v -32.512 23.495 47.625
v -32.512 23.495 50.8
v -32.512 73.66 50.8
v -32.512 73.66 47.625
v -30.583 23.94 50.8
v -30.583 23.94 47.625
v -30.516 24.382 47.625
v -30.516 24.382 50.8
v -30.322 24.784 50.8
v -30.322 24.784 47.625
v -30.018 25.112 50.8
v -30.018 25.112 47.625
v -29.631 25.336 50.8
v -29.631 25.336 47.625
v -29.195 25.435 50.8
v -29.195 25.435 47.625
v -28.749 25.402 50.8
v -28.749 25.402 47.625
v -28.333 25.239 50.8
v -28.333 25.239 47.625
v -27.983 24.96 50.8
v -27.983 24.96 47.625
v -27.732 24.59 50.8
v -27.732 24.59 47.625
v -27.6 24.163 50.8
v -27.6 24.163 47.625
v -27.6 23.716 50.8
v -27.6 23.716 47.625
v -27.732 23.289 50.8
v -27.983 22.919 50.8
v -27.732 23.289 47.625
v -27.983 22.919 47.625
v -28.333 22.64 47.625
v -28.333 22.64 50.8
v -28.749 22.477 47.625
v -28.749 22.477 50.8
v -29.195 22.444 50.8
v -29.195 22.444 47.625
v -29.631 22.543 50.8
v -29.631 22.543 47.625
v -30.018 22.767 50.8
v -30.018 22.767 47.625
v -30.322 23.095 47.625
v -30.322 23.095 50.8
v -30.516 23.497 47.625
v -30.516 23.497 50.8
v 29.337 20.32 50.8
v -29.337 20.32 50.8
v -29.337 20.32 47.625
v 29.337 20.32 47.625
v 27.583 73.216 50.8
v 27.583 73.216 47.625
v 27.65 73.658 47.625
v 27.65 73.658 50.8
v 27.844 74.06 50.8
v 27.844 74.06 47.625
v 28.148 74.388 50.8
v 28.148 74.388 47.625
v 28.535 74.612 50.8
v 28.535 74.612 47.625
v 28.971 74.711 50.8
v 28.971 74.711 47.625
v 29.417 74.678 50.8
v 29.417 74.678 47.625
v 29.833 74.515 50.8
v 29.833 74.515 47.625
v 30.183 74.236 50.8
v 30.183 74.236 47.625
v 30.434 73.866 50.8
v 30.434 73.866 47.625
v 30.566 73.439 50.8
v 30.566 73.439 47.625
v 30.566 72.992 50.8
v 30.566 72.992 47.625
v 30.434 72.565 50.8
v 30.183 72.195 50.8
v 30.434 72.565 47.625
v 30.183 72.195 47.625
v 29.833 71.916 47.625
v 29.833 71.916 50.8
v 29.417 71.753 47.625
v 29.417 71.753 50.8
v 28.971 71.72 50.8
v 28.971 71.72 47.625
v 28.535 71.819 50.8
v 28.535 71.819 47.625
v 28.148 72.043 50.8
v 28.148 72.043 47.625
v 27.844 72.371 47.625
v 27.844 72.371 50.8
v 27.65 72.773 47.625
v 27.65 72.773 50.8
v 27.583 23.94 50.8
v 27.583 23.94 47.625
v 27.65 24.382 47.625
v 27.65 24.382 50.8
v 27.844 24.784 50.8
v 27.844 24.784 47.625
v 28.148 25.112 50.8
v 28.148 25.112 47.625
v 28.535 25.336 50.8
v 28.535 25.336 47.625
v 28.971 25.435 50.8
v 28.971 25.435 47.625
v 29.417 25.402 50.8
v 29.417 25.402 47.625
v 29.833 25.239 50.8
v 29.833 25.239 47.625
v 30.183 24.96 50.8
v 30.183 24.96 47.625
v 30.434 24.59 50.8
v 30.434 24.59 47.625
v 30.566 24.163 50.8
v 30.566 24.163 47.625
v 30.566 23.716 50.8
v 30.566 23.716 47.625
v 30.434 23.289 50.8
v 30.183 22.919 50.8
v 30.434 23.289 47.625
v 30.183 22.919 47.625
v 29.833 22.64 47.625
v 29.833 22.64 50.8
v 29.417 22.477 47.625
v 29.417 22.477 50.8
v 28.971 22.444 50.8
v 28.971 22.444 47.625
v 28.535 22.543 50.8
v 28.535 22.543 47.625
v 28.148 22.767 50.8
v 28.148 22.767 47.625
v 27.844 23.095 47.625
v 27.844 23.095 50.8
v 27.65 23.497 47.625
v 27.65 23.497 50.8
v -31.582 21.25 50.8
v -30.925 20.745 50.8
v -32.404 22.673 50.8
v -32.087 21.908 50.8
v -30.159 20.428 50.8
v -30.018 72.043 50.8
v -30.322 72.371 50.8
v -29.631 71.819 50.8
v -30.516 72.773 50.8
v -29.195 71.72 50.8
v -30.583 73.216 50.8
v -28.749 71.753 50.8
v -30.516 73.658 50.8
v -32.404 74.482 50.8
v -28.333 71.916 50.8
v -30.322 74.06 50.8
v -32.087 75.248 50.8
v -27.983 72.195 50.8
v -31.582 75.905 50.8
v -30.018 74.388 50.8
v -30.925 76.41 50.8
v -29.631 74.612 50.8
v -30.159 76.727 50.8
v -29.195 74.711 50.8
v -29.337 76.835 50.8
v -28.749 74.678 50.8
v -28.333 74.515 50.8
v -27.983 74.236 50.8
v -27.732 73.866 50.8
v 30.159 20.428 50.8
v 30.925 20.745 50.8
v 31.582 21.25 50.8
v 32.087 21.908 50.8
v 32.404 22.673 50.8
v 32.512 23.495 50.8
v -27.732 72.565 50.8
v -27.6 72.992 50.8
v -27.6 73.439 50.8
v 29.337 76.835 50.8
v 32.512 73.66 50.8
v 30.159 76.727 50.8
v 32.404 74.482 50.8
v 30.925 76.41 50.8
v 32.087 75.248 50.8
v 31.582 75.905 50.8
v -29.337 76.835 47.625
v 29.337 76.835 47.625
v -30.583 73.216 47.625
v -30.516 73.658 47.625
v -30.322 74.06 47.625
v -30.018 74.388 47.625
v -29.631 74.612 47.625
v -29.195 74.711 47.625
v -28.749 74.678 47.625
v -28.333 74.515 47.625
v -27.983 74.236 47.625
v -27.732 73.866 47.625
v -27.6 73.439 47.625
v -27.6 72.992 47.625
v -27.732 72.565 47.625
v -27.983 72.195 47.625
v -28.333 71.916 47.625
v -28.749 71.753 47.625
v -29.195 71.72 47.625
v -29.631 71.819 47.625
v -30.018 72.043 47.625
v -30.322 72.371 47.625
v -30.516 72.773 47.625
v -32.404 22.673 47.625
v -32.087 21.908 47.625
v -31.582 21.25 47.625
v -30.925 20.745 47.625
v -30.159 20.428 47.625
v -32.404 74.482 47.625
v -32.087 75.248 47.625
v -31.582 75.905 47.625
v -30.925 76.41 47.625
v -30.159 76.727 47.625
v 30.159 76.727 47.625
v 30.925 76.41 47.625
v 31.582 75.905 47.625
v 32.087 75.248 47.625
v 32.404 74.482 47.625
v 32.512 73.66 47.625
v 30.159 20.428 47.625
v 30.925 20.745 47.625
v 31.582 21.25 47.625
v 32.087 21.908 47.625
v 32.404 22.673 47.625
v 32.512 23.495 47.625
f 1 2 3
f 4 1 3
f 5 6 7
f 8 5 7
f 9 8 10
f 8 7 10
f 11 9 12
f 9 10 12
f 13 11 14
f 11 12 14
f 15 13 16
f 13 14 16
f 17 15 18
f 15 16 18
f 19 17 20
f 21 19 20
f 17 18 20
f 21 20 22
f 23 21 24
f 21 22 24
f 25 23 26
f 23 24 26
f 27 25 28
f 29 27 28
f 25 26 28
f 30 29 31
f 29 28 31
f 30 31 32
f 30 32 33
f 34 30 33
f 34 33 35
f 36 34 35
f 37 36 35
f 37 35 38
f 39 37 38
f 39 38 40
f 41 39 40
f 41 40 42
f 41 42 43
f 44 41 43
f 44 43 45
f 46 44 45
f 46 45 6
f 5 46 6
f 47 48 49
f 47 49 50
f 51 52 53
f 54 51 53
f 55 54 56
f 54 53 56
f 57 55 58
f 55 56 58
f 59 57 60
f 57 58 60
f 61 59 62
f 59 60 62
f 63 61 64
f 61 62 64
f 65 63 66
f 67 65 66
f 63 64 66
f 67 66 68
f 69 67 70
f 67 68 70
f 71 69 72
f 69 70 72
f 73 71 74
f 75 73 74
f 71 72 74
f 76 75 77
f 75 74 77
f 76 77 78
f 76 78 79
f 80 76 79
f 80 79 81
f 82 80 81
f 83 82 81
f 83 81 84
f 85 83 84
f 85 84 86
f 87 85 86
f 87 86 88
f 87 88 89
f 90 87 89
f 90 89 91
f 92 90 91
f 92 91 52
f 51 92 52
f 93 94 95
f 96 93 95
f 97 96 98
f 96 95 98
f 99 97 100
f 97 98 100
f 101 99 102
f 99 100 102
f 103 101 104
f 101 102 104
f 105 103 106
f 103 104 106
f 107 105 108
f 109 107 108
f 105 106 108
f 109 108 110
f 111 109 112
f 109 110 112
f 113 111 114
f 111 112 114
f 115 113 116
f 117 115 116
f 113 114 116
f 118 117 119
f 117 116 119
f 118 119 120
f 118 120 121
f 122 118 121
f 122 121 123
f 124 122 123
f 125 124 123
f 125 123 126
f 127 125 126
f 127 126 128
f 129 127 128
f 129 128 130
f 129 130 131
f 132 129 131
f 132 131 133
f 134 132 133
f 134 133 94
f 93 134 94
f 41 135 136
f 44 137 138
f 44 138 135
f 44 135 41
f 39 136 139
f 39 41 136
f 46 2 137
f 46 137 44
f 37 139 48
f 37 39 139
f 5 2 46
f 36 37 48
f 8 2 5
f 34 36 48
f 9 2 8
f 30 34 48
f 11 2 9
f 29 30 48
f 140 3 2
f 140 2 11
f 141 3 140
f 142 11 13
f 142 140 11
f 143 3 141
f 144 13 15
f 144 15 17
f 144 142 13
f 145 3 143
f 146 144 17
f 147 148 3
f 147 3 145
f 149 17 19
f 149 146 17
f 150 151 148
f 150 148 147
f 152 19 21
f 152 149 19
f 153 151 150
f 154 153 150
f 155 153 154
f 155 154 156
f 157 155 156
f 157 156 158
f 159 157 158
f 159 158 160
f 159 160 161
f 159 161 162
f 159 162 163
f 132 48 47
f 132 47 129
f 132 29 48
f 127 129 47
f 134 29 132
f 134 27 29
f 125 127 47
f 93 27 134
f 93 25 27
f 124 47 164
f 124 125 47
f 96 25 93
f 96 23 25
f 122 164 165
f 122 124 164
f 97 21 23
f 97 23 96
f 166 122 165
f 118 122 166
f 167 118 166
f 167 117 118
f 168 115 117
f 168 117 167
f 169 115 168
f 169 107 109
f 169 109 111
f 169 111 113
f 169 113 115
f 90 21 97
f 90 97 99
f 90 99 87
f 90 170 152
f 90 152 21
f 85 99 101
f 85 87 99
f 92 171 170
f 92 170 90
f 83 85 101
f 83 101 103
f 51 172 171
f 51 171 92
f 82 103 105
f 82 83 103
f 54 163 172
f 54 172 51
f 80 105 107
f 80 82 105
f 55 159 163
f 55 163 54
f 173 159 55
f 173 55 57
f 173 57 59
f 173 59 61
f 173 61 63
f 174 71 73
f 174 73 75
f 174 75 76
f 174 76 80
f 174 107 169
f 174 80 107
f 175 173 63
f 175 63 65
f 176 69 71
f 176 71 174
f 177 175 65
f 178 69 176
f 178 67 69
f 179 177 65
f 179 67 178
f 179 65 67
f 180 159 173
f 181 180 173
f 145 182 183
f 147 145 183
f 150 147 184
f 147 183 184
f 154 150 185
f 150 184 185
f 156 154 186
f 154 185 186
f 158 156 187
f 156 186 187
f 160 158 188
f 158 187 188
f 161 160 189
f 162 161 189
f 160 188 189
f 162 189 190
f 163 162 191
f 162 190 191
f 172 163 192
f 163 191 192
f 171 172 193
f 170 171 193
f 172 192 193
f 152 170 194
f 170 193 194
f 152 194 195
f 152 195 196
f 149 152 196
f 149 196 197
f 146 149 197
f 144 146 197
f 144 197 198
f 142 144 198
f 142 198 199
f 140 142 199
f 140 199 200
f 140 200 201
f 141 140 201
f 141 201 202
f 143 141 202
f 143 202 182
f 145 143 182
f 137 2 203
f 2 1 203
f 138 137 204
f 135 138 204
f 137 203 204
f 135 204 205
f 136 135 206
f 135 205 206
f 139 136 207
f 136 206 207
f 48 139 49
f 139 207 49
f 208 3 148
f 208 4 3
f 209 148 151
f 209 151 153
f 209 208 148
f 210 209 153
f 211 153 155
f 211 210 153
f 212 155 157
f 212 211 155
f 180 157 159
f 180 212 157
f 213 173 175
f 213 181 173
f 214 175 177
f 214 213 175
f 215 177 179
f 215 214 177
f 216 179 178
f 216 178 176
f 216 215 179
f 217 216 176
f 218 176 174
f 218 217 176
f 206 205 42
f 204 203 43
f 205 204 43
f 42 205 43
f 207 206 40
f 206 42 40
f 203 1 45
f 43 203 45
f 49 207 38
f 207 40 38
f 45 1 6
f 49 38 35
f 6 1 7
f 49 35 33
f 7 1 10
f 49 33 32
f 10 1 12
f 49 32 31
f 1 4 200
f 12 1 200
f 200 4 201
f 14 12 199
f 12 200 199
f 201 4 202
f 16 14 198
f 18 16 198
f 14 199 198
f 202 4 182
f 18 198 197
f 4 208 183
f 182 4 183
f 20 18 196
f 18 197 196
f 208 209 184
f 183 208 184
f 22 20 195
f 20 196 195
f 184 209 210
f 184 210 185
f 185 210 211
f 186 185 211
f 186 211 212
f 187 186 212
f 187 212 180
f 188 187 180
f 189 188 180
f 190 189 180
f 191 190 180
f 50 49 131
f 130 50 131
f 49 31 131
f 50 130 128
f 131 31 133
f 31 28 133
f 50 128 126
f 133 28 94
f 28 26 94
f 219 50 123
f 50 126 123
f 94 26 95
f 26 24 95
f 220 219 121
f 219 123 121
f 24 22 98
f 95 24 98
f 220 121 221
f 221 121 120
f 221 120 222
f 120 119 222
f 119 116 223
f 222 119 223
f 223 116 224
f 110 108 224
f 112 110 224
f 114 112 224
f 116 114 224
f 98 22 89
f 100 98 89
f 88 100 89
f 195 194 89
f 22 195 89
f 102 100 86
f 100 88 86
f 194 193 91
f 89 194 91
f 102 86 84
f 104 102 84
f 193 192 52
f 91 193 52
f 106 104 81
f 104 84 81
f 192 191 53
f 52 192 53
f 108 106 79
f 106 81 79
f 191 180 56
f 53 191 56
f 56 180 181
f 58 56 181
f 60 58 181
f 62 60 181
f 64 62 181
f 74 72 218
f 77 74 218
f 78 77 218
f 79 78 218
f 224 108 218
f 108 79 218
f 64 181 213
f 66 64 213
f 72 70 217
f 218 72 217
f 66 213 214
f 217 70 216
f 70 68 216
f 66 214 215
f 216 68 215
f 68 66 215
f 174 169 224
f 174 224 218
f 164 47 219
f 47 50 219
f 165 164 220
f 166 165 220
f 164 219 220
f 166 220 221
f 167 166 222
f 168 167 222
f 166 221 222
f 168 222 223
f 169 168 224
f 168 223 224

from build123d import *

# Parameters (mm, degrees)
SKETCH2_W                 = 65.024
SKETCH2_H                 = 56.515
BOSS_EXTRUDE1_DEPTH       = 3.175
F_3_0MM_DOWEL_HOLE1_D     = 3
F_3_0MM_DOWEL_HOLE1_DEPTH = 3.175
FILLET1_R                 = 3.175


with BuildPart() as part:
    # Sketch2 → Boss-Extrude1 (new body)
    with BuildSketch(Plane.XY.offset(50.8)):
        with Locations((0, 48.5775)):
            Rectangle(SKETCH2_W, SKETCH2_H)
    extrude(amount=-BOSS_EXTRUDE1_DEPTH)

    # Ø3.0mm Dowel Hole1
    with Locations(Plane.XY.offset(50.8)):
        with Locations((29.083, 73.2155), (29.083, 23.9395), (-29.083, 23.9395), (-29.083, 73.2155)):
            Hole(F_3_0MM_DOWEL_HOLE1_D / 2, depth=F_3_0MM_DOWEL_HOLE1_DEPTH)

    # Fillet1
    fillet1_edges = [part.edges().sort_by_distance(p)[0] for p in [
        (-32.512, 76.835, 49.2125),
        (32.512, 76.835, 49.2125),
        (32.512, 20.32, 49.2125),
        (-32.512, 20.32, 49.2125),
    ]]
    fillet(fillet1_edges, radius=FILLET1_R)


solid = part.part
